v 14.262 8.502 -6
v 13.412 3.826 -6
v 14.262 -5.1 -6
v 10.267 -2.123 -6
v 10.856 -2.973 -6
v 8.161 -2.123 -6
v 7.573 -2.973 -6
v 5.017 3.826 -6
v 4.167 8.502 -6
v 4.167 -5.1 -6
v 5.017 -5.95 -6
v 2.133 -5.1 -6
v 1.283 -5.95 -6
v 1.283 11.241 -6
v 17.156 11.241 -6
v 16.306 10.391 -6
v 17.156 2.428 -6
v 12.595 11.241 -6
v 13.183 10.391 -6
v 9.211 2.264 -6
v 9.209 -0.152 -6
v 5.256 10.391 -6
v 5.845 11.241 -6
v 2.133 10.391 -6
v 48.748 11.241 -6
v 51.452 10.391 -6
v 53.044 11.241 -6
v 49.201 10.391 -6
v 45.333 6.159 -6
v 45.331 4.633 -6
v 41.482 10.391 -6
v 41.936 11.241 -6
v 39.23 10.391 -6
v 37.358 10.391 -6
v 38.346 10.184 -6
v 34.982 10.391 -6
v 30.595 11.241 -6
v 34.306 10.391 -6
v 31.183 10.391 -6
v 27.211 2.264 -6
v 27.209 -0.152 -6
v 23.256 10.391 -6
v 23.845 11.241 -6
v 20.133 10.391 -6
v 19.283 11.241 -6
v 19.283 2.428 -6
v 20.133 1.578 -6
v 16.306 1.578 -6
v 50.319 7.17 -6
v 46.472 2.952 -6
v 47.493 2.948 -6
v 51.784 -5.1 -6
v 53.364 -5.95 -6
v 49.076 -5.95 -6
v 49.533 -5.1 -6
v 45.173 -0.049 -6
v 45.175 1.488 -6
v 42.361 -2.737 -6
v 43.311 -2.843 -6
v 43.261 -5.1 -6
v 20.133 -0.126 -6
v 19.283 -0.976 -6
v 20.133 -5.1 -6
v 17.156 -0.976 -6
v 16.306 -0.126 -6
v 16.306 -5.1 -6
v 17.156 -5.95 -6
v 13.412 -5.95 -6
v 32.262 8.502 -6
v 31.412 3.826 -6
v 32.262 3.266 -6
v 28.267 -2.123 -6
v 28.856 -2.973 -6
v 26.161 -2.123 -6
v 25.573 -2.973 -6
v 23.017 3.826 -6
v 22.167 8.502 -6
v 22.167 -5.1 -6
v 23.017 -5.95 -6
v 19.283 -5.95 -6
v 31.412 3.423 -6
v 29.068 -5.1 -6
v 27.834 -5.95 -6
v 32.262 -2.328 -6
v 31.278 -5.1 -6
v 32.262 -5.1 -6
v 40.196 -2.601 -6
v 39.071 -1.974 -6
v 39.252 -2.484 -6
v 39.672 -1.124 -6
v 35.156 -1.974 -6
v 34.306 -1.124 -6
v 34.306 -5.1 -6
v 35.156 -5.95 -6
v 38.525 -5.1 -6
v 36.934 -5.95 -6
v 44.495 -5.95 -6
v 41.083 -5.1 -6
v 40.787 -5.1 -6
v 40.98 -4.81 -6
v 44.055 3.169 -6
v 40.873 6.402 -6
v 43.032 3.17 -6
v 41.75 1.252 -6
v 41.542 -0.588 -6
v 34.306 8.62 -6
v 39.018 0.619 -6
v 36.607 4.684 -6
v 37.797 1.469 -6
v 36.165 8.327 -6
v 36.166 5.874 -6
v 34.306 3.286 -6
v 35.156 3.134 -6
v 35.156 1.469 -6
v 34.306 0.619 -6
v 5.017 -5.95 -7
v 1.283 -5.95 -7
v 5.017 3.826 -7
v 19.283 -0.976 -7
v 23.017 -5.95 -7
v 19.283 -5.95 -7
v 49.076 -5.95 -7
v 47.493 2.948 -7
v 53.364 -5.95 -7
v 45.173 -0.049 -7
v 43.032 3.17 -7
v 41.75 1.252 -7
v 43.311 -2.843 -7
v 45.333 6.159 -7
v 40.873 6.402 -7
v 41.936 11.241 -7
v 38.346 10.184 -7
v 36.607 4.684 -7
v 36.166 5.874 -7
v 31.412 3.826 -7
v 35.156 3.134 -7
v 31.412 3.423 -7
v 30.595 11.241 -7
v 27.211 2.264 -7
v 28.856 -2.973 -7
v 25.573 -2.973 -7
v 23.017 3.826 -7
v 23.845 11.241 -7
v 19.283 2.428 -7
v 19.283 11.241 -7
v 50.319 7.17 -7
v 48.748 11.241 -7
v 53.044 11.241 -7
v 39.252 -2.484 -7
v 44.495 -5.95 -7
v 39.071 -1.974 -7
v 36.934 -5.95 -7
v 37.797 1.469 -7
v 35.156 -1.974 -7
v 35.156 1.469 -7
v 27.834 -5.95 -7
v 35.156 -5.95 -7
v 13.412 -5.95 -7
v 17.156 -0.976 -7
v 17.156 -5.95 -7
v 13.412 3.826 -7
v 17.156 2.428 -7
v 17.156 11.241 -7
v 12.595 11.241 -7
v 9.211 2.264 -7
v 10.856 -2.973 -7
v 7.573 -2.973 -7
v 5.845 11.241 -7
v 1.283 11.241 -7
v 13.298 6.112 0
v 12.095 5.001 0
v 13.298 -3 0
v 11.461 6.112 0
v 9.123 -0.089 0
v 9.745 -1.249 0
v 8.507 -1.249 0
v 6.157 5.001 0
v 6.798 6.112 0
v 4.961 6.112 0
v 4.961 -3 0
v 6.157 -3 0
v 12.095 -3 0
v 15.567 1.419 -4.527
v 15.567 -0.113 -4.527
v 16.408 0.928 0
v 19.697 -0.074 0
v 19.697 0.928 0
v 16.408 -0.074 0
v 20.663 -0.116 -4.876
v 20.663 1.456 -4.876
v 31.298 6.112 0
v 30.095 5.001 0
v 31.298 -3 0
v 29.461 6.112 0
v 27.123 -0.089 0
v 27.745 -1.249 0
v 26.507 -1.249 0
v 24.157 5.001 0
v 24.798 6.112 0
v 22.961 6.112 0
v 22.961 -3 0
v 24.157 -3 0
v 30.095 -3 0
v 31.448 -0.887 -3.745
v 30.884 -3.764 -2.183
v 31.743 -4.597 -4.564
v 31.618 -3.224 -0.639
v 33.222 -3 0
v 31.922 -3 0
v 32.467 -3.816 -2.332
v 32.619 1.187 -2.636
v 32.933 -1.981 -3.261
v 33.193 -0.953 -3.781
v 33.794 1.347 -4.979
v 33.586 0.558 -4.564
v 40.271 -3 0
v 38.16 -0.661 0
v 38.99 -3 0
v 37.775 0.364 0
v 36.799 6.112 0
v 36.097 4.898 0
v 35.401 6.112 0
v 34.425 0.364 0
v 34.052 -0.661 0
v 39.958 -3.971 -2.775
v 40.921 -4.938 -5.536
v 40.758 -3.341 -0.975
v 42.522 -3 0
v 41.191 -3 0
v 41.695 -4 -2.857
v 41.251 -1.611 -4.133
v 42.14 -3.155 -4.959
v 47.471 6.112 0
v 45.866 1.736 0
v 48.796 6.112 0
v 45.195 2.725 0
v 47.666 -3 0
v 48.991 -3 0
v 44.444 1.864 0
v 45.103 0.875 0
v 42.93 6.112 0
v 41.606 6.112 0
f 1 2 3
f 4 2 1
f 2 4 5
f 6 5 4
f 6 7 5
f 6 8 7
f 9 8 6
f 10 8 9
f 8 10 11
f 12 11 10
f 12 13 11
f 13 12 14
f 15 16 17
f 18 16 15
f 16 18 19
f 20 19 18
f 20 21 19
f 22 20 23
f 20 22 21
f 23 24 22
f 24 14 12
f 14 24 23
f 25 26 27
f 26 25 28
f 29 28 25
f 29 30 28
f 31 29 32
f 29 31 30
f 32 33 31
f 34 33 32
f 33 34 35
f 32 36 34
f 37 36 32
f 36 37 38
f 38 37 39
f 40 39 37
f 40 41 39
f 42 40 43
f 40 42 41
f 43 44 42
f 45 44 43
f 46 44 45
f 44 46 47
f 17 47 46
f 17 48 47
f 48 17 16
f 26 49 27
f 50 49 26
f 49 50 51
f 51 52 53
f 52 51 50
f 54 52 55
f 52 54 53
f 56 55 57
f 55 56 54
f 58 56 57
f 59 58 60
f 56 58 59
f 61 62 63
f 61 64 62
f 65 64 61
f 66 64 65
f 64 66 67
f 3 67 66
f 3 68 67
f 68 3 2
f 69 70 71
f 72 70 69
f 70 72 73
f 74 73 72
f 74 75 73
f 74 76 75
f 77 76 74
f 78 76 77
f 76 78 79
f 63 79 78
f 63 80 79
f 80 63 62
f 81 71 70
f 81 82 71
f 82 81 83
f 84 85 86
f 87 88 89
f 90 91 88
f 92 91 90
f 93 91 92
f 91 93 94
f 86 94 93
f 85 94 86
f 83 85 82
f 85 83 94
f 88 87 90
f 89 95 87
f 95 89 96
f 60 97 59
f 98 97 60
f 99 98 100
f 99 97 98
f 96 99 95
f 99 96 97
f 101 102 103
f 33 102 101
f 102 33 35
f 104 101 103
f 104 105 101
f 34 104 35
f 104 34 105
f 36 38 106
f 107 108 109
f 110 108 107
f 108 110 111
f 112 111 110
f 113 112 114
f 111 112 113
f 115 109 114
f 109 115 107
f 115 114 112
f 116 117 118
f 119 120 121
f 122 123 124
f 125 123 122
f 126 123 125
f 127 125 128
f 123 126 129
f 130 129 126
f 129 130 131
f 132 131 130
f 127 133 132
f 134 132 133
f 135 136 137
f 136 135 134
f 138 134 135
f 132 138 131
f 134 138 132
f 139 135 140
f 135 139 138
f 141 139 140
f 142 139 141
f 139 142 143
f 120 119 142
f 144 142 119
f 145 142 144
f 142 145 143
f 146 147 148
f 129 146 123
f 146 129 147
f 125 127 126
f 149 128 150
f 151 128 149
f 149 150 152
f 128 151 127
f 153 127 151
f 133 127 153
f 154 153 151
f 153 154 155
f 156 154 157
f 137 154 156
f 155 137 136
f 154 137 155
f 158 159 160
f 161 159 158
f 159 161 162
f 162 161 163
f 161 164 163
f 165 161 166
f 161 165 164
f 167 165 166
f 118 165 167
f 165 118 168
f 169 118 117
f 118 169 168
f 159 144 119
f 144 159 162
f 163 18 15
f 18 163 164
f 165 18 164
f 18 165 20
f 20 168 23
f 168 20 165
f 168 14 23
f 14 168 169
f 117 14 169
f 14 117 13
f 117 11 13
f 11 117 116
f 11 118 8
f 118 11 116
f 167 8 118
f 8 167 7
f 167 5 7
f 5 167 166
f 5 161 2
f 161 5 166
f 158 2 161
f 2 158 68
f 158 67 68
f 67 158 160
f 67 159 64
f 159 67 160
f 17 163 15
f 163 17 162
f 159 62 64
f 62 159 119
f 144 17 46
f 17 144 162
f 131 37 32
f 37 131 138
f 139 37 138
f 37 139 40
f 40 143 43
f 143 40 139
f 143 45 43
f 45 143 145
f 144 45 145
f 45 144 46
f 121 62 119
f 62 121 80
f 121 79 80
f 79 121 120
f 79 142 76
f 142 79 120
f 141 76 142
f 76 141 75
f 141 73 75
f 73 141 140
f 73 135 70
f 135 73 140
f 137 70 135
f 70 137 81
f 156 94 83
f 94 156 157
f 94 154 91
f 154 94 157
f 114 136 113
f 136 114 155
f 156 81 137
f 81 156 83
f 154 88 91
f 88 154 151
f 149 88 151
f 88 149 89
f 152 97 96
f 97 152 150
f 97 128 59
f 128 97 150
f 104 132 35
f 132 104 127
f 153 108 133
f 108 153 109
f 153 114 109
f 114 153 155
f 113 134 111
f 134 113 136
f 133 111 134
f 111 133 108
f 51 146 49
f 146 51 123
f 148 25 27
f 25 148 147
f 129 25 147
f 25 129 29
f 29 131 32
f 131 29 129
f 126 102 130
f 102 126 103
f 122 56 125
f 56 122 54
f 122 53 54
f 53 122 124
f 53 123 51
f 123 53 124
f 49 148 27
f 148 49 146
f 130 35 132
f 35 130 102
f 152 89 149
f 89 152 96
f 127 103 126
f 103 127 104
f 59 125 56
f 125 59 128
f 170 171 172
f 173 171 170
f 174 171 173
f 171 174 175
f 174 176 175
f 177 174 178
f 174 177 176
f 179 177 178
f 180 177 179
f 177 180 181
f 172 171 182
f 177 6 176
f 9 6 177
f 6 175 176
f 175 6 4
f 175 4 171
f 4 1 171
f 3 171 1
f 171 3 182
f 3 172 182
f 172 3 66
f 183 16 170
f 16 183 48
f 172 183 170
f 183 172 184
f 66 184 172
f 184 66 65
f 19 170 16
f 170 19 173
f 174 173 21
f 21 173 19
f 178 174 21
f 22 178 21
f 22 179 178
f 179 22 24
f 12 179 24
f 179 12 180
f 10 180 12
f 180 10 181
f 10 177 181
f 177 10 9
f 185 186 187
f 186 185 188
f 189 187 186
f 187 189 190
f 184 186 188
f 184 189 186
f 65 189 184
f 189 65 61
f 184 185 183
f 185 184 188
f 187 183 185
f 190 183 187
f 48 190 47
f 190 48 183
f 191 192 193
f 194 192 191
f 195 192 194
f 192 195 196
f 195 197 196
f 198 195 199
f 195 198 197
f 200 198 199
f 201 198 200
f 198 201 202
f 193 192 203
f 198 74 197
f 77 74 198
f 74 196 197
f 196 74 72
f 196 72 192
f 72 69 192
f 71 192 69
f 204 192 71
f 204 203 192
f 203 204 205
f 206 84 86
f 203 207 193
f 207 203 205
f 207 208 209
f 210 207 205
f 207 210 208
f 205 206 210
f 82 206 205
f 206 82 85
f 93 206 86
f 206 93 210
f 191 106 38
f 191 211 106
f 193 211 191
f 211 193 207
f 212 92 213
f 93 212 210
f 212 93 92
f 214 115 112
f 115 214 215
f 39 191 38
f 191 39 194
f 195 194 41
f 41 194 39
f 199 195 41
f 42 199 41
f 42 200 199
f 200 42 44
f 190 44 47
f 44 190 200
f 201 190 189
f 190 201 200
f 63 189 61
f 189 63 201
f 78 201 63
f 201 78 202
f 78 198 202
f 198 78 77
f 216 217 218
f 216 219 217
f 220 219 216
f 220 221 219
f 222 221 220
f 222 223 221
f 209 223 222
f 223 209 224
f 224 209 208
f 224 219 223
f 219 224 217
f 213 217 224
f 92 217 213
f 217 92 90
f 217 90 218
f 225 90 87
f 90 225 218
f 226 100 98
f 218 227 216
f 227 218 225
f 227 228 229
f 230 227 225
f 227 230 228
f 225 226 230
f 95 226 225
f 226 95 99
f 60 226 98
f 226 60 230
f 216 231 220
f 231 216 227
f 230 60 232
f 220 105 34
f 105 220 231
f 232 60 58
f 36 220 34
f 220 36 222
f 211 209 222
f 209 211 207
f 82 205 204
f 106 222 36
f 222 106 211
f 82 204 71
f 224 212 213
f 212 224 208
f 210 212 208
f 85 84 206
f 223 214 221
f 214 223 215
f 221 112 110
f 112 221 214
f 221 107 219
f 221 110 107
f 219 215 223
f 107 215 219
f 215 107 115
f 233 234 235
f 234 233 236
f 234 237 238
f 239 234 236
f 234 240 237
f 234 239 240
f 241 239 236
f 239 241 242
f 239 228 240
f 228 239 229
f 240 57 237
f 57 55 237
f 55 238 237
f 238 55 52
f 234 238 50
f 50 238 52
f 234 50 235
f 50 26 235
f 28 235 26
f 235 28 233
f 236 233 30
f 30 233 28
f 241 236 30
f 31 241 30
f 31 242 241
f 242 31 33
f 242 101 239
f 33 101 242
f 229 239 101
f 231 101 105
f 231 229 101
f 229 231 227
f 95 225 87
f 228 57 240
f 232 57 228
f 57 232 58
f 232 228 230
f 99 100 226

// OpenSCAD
// Champhered_Nameplate.scad
// https://www.thingiverse.com/thing:3089014
// removed the included fontlist that wasn't on my pc 9/8/18

//Set the text to render
textstring="M-MAX";

//Font name
fontname= "Old English Text MT:style=Regular"; // pick from font list off of help menu


//type
type="tag"; //[container, tag, hollow]

//where to extrude
shiftit=0.3;

//scaling up
scale=1.7;

//Text height (extrusion) in mm
textheight=6;

//Set font size in mm
textsize=10; 

//wall thickness
wall=1;

//text kerning - in font size
width_factor=.9;

//rim to combine the text
rim=0.5;

//close gaps e.g. to the dot of an i...
delta=0.5;
    


/* [Hidden] */
//-------------------------------------------------------------------------------
function is_monospaced() = 
    (fontname=="Cutive Mono" || fontname=="Droid Sans Mono" ||fontname=="Fira Mono" ||fontname=="Nova Mono" ||fontname=="PT Mono" ||fontname=="Rubik Mono" ||fontname=="Share Tech Mono" ||fontname=="Ubuntu Mono" )? 1 : 0;

echo (is_monospaced()) ;
width_big=textsize*width_factor;
width_small=textsize*width_factor*(is_monospaced()?1:.75);
width_tiny=textsize*width_factor*(is_monospaced()?1:.25);

function is_narrow_letter(c) =
    (c=="t" ||c=="f" || c=="l" || c=="i" || c=="j") ? 1 : 0;
function is_space(c) =
    (c=="." ||c==";" || c==" ") ? 1 : 0;
function width(c,d) = 
    (is_narrow_letter(c)==1 && is_narrow_letter(d)==1) ? width_small/2 : 
    (is_narrow_letter(c)==1 || is_narrow_letter(d)==1) ? width_small : 
    (is_space(c)==1 && is_space(d)==1) ? width_tiny/2 : 
    (is_space(c)==1 || is_space(d)==1) ? width_tiny : 
    width_big;
    
function widthfunction(i) = width(textstring[i-1],textstring[i-2]);
function totalwidthfunction(x) = x < 1 ? 0 : widthfunction(x) + totalwidthfunction(x - 1);
//input = [1, 3, 5, 8];
width = [for (a = [ 1 : len(textstring) ]) totalwidthfunction(a) ];
echo(width); // ECHO: [1, 6, 15, 36]

dummy_cutoutlen=len(textstring)*textsize;

/*
Customizable Text Storage Box
Version 7, November 2017
Written by MC Geisler (mcgenki at gmail dot com)

If you need to store Stuff in letters, this is the way to go.
Each letter and also the dots of 'i' and 'j' are connected together, so after printing it will not fall apart.
Have fun!

License: Attribution 4.0 International (CC BY 4.0)

You are free to:
    Share - copy and redistribute the material in any medium or format
    Adapt - remix, transform, and build upon the material
    for any purpose, even commercially.
*/

    
module writetext(textstr, sizeit)
{
    text(textstr,size=sizeit*.9,font=fontname,halign="center",valign="baseline");
}

module RiseText(textstr, textsize,textheight) 
{
    difference()
    {
        union()
        {
            for(i=[0:1:len(textstr)-1])
            {
                //extruded text
                translate([width[i],0,0])
                    linear_extrude(height=textheight,convexity = 32, scale = scale)
                        translate([0,-textsize*shiftit,0])
                            writetext(textstr[i], textsize);
                               
                //backplane
                if(type=="tag")
                {
                    translate([width[i],0,textheight-0*wall])
                        linear_extrude(height=wall,convexity = 32)
                            scale([scale,scale,1])
                                translate([0,-textsize*shiftit,0])
                                    offset(delta=-delta)   
                                        offset(delta=delta+rim)
                                            writetext(textstr[i], textsize);     


                    translate([width[i],0,textheight-0*wall])
                        linear_extrude(height=wall,convexity = 32)
                                    scale([scale,scale,1])
                                       translate([0,-textsize*shiftit,0])
                                            offset(delta=rim)
                                                writetext(textstr[i], textsize);      
                }
            }

        
        }

        if (type=="container")
        {
            translate([0,0,wall])
                for(i=[0:1:len(textstr)-1])
                {
                    translate([width[i],0,0])
                        linear_extrude(height=textheight,convexity = 32, scale = scale)
                            translate([0,-textsize*shiftit,0])
                                offset(delta=-wall)
                                    writetext(textstr[i], textsize);
                }
        }
    
 
        if (type=="hollow")
        scale([1,1,1])
            translate([0,0,-wall])
                for(i=[0:1:len(textstr)-1])
                {
                    translate([width[i],0,0])
                        linear_extrude(height=textheight,convexity = 32, scale = 0.3)
                            translate([0,-textsize*shiftit,0])
                               //offset(delta=-wall)
                                    writetext(textstr[i], textsize);
                }
    
    
    }
}


if (type=="tag" || type=="hollow")
{
   scale([1,1,-1])
        RiseText(textstring,textsize,textheight);
}
else
{
    RiseText(textstring,textsize,textheight);
}
